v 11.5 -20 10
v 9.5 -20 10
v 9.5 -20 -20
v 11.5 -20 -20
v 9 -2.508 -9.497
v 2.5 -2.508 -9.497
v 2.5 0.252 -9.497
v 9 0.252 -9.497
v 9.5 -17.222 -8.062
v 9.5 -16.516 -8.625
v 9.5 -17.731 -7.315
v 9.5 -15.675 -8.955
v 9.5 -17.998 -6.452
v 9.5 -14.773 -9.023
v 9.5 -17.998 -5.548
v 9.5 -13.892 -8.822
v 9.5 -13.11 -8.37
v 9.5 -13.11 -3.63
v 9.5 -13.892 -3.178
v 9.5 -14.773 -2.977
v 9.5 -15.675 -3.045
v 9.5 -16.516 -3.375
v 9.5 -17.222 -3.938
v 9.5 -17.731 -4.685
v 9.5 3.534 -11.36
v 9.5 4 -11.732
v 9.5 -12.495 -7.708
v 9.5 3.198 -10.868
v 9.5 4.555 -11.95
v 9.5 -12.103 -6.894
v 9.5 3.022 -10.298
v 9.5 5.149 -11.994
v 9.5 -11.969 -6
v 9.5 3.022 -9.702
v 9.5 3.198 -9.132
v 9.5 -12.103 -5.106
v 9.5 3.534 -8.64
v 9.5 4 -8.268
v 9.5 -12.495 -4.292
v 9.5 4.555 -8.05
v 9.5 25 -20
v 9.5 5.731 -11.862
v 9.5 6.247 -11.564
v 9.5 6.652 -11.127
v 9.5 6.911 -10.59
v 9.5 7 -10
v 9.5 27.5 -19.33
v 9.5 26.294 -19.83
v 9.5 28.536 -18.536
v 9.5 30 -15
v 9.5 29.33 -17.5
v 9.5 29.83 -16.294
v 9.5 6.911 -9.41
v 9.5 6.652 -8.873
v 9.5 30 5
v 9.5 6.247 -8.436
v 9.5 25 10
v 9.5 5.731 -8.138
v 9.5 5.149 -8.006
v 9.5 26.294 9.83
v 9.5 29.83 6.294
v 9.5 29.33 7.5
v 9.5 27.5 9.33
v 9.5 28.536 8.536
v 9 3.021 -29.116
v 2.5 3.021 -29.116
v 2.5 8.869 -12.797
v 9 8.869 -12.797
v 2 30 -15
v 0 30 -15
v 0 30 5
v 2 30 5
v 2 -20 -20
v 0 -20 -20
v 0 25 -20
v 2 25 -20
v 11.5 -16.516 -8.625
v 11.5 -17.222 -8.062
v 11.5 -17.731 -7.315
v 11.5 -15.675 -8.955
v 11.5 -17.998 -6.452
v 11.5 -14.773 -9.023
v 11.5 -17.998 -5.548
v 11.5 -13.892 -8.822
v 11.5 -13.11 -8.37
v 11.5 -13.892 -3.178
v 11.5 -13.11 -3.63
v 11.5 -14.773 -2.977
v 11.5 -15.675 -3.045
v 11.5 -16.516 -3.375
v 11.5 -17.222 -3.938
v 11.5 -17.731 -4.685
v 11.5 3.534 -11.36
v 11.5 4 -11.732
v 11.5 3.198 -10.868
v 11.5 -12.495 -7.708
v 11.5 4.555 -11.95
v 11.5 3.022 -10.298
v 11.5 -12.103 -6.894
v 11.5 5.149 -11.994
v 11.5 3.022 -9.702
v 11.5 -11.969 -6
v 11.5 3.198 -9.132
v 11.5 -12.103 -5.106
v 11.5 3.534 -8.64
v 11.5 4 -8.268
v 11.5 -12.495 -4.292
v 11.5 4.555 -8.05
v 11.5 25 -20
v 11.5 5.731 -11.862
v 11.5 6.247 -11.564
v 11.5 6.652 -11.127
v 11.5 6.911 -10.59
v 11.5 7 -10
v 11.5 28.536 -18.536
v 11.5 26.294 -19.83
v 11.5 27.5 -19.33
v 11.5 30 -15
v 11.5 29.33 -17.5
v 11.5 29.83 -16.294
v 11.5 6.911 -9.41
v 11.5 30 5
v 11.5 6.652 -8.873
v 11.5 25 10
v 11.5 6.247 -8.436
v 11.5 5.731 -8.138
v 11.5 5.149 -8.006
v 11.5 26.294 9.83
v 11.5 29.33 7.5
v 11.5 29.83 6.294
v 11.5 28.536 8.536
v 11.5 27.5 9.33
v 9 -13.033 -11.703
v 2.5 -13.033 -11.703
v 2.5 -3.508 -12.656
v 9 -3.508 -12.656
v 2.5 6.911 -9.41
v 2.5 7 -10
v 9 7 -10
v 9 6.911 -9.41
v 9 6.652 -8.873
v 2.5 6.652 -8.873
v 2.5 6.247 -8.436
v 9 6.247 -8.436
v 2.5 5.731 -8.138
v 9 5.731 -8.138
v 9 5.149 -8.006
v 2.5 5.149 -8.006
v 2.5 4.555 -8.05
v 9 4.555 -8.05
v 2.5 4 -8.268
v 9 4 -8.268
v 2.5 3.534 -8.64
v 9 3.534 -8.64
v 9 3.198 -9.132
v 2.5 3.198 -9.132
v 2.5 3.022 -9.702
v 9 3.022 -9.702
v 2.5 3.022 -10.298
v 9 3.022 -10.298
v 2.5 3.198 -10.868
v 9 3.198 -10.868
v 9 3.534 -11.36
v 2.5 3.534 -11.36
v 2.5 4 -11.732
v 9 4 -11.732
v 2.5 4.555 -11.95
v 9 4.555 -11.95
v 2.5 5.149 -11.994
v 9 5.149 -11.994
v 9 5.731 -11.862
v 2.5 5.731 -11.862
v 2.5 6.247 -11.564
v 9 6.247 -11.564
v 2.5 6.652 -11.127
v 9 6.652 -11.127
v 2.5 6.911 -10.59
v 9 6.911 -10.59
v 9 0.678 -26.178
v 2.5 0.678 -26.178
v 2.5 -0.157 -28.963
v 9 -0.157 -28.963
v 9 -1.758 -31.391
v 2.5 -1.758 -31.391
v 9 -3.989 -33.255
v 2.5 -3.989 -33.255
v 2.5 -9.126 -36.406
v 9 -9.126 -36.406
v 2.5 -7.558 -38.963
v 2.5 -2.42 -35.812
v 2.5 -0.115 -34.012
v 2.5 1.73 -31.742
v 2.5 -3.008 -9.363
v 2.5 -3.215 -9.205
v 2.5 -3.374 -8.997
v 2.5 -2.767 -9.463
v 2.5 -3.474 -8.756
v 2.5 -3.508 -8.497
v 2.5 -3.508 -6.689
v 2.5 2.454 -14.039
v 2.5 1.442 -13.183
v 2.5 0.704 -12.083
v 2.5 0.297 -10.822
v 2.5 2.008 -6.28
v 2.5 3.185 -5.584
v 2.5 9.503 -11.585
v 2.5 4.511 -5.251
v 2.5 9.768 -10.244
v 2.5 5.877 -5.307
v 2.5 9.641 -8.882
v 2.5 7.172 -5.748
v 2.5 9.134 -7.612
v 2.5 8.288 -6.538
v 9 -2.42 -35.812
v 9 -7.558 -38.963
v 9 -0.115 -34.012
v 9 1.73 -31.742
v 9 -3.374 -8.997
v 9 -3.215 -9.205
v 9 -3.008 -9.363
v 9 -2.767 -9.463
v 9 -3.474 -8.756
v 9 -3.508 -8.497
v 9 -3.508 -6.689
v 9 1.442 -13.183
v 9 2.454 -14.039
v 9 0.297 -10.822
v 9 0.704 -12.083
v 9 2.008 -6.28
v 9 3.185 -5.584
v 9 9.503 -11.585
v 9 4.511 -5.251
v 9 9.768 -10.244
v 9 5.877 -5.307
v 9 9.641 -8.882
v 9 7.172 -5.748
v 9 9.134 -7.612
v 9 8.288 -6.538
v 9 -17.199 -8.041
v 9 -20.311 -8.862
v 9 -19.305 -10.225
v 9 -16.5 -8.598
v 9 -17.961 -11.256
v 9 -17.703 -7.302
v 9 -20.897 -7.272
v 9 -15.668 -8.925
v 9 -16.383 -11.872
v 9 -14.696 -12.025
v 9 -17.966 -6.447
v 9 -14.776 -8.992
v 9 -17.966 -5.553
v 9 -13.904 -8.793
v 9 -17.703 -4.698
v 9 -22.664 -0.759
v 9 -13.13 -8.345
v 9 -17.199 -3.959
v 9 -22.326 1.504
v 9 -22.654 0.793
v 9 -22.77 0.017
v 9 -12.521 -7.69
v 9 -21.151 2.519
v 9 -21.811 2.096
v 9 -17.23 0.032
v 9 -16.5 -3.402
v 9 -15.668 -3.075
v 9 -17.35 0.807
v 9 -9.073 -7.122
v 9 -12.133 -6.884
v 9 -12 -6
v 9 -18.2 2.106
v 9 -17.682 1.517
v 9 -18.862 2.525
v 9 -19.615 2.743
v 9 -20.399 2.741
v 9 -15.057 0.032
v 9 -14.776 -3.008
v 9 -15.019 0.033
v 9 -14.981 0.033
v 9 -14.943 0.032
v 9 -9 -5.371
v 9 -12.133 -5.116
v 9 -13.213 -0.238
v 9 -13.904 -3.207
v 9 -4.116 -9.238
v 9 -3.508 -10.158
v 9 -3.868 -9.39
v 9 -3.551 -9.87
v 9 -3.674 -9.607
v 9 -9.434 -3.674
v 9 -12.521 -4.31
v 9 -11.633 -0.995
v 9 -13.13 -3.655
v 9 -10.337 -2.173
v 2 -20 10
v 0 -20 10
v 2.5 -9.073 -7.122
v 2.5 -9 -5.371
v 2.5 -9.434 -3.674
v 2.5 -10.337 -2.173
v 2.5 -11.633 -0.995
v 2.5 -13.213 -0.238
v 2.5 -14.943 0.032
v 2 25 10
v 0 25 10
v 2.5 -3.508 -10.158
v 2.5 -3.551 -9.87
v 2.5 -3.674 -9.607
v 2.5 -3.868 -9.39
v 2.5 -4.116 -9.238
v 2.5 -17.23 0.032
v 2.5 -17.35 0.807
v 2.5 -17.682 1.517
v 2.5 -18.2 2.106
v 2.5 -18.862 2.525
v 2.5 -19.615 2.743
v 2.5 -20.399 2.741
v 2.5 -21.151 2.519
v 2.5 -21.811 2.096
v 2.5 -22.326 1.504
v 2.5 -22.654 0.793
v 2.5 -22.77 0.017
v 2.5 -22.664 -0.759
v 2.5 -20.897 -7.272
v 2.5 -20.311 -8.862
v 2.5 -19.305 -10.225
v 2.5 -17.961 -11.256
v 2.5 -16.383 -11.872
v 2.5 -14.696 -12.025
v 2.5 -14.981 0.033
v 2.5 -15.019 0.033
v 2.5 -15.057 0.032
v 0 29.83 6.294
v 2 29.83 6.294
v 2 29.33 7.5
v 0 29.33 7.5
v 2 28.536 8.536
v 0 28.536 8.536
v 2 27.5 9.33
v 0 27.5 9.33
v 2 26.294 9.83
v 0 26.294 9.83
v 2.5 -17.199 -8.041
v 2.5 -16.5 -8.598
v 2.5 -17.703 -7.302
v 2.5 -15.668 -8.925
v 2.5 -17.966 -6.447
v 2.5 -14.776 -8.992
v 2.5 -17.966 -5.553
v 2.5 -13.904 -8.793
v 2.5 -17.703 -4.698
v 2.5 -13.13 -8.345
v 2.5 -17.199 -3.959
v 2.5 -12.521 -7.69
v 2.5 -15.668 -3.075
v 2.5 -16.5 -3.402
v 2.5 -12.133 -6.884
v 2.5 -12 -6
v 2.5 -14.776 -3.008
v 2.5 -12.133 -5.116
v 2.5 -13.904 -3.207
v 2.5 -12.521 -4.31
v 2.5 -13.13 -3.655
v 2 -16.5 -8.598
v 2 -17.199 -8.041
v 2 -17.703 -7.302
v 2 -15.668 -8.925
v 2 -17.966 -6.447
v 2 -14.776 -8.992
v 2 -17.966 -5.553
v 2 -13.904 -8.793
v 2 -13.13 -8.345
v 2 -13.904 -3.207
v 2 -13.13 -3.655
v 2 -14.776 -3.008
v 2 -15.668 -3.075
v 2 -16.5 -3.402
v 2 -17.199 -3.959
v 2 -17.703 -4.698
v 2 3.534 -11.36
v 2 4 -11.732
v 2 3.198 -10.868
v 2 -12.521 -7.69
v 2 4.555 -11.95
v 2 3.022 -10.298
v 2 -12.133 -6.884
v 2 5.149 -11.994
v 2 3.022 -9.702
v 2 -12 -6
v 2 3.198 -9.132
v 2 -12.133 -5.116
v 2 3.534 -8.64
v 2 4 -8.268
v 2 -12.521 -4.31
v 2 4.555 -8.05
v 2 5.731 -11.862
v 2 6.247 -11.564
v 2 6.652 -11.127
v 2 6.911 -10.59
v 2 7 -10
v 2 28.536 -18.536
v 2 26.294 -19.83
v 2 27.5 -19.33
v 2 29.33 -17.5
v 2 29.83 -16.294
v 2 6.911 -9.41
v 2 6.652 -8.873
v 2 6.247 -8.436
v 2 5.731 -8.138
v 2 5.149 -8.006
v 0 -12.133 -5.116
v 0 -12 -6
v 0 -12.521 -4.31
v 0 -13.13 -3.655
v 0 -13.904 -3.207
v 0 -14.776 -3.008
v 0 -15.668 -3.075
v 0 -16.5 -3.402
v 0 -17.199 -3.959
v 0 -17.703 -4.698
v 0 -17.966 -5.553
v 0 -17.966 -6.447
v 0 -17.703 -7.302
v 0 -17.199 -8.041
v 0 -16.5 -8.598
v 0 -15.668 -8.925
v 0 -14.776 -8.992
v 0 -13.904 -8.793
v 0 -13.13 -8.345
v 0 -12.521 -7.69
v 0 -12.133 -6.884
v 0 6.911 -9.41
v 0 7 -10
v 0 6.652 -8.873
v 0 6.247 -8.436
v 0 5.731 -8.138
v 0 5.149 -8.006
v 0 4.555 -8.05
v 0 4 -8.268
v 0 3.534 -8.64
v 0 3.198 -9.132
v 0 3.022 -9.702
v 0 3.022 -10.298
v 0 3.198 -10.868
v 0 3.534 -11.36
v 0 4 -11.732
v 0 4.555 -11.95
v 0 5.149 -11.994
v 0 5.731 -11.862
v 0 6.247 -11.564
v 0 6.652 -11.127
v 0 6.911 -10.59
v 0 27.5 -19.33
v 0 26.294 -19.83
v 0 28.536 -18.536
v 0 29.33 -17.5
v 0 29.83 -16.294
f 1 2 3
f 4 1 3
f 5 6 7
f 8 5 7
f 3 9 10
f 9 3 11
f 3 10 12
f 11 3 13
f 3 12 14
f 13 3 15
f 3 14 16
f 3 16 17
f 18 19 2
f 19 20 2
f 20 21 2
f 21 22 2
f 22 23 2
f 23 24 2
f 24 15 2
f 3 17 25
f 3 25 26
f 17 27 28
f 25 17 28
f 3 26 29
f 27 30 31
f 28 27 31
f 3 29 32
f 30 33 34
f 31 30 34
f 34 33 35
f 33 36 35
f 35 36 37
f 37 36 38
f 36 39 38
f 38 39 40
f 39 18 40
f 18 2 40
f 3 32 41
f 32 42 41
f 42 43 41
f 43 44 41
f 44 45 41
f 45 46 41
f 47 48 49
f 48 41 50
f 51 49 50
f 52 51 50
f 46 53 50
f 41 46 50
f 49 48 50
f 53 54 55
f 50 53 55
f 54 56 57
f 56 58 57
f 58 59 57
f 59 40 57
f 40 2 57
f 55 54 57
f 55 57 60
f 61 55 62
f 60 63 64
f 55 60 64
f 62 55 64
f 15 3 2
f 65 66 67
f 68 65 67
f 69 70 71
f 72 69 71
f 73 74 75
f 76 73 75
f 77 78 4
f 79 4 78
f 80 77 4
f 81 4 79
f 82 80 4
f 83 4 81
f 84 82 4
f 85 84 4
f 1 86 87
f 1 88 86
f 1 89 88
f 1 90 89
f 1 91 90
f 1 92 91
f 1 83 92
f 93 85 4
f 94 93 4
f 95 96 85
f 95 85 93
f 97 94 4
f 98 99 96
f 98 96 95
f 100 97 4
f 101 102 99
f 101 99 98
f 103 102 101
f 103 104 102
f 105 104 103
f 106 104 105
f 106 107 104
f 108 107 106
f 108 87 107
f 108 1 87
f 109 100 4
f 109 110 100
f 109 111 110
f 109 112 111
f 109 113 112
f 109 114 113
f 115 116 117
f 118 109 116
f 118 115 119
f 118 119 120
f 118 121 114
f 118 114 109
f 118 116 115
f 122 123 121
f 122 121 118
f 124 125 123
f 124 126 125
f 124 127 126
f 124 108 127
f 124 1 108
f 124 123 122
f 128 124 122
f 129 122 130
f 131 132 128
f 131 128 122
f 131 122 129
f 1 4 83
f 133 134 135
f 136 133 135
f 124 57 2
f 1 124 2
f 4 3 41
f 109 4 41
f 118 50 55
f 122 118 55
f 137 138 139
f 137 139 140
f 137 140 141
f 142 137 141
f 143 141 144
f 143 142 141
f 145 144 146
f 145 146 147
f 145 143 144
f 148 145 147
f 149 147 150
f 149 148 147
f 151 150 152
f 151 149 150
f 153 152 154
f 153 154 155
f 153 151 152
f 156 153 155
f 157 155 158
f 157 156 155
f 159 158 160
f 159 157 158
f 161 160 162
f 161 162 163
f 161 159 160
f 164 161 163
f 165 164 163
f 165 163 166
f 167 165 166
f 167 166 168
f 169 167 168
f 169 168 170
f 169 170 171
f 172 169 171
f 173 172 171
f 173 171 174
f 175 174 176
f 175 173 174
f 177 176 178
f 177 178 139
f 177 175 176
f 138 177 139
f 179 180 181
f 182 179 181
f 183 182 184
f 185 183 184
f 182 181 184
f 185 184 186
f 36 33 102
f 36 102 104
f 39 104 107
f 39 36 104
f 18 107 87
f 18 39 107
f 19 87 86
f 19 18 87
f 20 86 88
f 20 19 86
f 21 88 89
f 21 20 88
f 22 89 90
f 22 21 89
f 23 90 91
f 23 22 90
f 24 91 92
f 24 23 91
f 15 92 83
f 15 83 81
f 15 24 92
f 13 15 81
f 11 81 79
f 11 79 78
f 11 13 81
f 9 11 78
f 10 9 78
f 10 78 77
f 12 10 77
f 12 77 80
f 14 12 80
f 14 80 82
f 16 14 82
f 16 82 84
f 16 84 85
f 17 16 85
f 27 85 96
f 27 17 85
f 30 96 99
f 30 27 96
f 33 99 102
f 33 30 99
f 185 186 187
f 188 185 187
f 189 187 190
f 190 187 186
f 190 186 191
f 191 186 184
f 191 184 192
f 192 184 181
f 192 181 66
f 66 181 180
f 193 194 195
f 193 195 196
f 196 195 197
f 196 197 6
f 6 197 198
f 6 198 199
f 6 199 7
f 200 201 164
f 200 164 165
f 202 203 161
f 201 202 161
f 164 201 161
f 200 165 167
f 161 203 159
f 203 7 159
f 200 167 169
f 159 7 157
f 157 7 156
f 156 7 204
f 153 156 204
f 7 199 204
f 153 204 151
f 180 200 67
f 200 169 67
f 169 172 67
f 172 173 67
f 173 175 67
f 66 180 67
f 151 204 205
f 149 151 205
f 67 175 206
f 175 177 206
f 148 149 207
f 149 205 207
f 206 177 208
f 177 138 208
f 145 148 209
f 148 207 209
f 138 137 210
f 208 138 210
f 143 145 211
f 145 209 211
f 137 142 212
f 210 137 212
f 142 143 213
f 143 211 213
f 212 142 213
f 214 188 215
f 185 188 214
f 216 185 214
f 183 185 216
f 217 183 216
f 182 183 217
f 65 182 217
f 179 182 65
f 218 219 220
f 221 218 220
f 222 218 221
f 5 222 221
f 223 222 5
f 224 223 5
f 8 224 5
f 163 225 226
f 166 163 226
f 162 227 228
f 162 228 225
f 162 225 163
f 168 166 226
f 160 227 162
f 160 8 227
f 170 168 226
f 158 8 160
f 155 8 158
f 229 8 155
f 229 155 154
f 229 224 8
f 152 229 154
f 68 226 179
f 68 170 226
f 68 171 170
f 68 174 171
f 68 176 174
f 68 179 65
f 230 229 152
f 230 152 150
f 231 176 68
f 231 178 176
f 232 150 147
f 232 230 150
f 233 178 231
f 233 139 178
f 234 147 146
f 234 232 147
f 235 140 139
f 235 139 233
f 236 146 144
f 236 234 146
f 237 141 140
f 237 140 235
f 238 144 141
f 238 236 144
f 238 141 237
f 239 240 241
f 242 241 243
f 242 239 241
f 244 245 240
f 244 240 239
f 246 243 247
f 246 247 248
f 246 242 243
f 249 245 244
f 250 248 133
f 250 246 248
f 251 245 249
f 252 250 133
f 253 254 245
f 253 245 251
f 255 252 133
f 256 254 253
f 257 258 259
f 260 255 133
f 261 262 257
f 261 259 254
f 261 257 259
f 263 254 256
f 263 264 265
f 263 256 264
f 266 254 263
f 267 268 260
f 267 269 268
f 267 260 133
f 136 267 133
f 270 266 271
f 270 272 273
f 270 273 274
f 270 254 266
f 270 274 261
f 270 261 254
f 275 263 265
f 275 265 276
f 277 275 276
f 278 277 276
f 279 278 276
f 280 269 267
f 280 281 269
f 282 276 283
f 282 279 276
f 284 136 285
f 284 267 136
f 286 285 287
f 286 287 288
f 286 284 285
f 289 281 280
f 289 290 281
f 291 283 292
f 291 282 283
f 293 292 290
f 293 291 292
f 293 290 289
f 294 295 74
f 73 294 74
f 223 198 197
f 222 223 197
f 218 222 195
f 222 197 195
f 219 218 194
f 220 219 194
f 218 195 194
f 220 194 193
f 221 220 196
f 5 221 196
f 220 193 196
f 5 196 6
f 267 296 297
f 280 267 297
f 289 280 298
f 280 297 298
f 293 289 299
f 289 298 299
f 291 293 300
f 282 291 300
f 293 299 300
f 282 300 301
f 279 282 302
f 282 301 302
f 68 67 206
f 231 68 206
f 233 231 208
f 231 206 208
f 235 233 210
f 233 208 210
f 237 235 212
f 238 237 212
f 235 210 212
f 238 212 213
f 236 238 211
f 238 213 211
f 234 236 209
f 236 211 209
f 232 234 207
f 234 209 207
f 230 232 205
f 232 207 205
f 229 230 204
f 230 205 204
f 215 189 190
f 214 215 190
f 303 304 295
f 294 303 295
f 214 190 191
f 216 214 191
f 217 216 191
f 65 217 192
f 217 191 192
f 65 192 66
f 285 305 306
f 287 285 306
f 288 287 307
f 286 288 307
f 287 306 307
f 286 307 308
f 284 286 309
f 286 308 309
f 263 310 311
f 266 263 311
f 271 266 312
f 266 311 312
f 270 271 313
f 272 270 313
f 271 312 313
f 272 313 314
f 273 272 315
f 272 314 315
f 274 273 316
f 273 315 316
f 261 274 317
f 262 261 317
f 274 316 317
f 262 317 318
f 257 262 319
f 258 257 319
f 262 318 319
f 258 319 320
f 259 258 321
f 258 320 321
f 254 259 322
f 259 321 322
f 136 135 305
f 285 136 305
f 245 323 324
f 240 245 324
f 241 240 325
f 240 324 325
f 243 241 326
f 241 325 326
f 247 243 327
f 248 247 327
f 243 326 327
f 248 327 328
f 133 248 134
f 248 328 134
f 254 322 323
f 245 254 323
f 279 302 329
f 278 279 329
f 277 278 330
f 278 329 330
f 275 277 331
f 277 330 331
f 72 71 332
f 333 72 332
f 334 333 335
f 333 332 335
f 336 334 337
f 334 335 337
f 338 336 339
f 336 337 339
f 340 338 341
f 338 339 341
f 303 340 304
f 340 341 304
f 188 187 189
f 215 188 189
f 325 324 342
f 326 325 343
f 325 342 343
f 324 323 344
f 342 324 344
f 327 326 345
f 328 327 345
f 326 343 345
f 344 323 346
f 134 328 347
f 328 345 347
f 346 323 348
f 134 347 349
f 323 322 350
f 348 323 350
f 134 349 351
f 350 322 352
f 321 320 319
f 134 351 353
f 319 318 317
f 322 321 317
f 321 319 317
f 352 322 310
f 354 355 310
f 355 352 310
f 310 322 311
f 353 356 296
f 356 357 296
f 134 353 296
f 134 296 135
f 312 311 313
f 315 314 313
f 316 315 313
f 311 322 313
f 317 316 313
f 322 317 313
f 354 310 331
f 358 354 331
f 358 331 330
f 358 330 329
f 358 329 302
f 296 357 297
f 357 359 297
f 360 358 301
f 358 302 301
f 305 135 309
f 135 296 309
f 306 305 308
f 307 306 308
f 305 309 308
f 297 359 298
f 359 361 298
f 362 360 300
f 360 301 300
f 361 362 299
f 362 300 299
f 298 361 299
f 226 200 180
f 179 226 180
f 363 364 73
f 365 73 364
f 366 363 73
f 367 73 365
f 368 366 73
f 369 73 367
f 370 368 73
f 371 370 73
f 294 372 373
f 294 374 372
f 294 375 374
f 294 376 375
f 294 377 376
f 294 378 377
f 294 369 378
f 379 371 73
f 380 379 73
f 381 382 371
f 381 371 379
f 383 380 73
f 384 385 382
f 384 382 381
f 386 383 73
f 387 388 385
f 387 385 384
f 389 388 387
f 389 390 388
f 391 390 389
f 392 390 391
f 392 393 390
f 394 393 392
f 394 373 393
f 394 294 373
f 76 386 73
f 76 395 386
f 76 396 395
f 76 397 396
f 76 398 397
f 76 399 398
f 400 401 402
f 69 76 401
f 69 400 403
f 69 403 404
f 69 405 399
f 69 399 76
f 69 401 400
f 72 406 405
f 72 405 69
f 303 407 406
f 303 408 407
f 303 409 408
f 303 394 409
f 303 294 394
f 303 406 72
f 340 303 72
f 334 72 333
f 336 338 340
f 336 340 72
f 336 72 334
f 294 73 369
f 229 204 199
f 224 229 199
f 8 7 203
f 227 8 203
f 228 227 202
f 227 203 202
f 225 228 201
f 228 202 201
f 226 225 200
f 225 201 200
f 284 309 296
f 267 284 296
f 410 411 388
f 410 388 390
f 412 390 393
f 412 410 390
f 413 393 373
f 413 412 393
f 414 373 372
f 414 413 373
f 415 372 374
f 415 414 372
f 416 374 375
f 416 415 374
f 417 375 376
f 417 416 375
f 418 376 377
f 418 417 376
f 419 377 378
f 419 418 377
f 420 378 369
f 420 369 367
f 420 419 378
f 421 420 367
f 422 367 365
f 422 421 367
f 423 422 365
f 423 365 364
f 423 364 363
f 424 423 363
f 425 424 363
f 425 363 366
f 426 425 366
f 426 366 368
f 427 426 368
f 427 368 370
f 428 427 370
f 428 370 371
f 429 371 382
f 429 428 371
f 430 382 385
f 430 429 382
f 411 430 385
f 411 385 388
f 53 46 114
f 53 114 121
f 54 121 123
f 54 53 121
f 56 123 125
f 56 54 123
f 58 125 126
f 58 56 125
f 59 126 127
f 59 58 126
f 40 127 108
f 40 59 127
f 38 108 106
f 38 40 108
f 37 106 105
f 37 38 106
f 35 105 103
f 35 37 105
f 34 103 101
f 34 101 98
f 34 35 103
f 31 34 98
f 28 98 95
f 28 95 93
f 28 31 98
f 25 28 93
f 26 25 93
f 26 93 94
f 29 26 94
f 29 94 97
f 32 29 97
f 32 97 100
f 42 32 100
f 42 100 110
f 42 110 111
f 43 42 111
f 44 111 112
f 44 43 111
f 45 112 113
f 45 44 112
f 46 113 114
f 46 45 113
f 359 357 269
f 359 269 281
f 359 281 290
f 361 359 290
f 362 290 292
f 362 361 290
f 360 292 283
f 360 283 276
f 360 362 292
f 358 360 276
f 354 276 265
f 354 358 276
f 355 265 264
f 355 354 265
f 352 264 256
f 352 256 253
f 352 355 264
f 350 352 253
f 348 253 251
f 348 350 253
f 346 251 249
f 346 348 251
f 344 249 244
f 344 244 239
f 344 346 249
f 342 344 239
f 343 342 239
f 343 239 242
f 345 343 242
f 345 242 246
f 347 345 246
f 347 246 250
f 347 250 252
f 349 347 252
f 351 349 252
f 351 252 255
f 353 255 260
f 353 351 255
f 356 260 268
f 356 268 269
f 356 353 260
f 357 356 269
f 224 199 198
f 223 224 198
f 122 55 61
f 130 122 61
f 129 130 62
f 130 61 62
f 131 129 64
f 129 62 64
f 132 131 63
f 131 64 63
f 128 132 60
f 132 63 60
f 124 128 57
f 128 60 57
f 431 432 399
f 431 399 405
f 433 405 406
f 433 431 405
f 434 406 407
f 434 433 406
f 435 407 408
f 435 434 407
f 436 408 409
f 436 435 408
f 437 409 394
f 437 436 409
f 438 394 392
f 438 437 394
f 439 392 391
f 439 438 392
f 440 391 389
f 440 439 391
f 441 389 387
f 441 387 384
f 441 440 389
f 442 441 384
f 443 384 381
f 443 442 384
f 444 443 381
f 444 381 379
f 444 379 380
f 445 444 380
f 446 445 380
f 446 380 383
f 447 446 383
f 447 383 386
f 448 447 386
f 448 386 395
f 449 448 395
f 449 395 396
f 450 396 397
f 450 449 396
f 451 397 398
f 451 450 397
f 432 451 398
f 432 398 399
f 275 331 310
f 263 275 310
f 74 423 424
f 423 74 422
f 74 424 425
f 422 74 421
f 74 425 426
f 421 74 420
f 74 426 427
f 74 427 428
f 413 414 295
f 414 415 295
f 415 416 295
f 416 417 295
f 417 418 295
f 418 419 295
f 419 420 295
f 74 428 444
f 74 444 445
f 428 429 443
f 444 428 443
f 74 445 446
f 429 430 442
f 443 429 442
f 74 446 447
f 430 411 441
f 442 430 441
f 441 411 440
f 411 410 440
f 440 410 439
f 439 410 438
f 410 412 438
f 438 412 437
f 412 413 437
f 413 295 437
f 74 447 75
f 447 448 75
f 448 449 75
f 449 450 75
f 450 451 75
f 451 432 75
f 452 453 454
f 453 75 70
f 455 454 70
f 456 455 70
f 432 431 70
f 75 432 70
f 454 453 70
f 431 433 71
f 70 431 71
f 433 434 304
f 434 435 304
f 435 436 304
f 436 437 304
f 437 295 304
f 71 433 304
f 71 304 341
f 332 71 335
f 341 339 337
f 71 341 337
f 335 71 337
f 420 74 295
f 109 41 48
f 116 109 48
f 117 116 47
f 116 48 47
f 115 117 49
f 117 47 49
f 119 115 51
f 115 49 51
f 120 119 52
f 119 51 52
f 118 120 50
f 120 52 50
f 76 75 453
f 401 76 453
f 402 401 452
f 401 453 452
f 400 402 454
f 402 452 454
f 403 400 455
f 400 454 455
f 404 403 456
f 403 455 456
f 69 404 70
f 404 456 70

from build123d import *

# Parameters (mm, degrees)
F0_R     = 3
F0_R_2   = 2
F1_DEPTH = 2
F3_START = 0.5
F2_R     = 3
F3_DEPTH = 6.5
F2_R_2   = 2
F5_START = 0.5
F4_R     = 3.0314707769
F4_R_2   = 2
F5_DEPTH = 2


with BuildPart() as f1:
    # F0 (on Right) → F1 (new body)
    with BuildSketch(Plane.YZ):
        with BuildLine():
            Line((25, 10), (-20, 10))
            Line((-20, 10), (-20, -20))
            Line((-20, -20), (25, -20))
            ThreePointArc((25, -20), (28.5355339059, -18.5355339059), (30, -15))
            Line((30, -15), (30, 5))
            ThreePointArc((30, 5), (28.5355339059, 8.5355339059), (25, 10))
        make_face()
        with Locations((-15, -6)):
            Circle(F0_R, mode=Mode.SUBTRACT)
        with Locations((5, -10)):
            Circle(F0_R_2, mode=Mode.SUBTRACT)
    extrude(amount=F1_DEPTH)


with BuildPart() as f3:
    # F2 (on face) → F3 (new body)
    with BuildSketch(Plane.YZ.offset(2).offset(F3_START)):
        with BuildLine():
            Line((-22.6637491681, -0.7594555912), (-20.8968037957, -7.2724931646))
            ThreePointArc((-20.8968037957, -7.2724931646), (-17.9609272097, -11.2558961099), (-13.03272348, -11.7027499466))
            Line((-13.03272348, -11.7027499466), (-3.5083352122, -12.6557552287))
            Line((-3.5083352122, -12.6557552287), (-3.5083352122, -10.1577758701))
            ThreePointArc((-3.5083352122, -10.1577758701), (-3.6738613113, -9.6067284051), (-4.1156418296, -9.2381064147))
            Line((-4.1156418296, -9.2381064147), (-9.0726259367, -7.1215037103))
            ThreePointArc((-9.0726259367, -7.1215037103), (-10.3366335686, -2.173180513), (-14.943107279, 0.0322713034))
            Line((-14.943107279, 0.0322713034), (-15.056892721, 0.0322713034))
            Line((-15.056892721, 0.0322713034), (-17.2302904505, 0.0322713034))
            ThreePointArc((-17.2302904505, 0.0322713034), (-20.3993930013, 2.7409519617), (-22.6637491681, -0.7594555912))
        make_face()
        with Locations((-15, -6)):
            Circle(F2_R, mode=Mode.SUBTRACT)
        with BuildLine():
            ThreePointArc((-14.943107279, 0.0322713034), (-15, 0.0325395862), (-15.056892721, 0.0322713034))
            Line((-15.056892721, 0.0322713034), (-14.943107279, 0.0322713034))
        make_face()
    extrude(amount=F3_DEPTH)


with BuildPart() as f3b:
    # F2 (on face) → F3, piece 2 (new body)
    with BuildSketch(Plane.YZ.offset(2).offset(F3_START)):
        with BuildLine():
            Line((-2.5083352122, -9.497422725), (0.2523448505, -9.497422725))
            ThreePointArc((0.2523448505, -9.497422725), (0.7040515837, -12.0827003001), (2.4539394436, -14.038612259))
            Line((2.4539394436, -14.038612259), (0.6775140536, -26.1783799444))
            ThreePointArc((0.6775140536, -26.1783799444), (-0.8687716335, -30.2355068211), (-3.9888260326, -33.2548674266))
            Line((-3.9888260326, -33.2548674266), (-9.1261887803, -36.4057830215))
            Line((-9.1261887803, -36.4057830215), (-7.5577032005, -38.9630966484))
            Line((-7.5577032005, -38.9630966484), (-2.4203404528, -35.8121810535))
            ThreePointArc((-2.4203404528, -35.8121810535), (0.8719091232, -32.9287608623), (3.0207551338, -29.1162183915))
            Line((3.0207551338, -29.1162183915), (8.8692096956, -12.796789171))
            ThreePointArc((8.8692096956, -12.796789171), (8.2877227219, -6.5382529497), (2.0075366127, -6.2800569612))
            Line((2.0075366127, -6.2800569612), (-3.5083352122, -6.6892408108))
            Line((-3.5083352122, -6.6892408108), (-3.5083352122, -8.497422725))
            ThreePointArc((-3.5083352122, -8.497422725), (-3.2154419934, -9.2045295061), (-2.5083352122, -9.497422725))
        make_face()
        with Locations((5, -10)):
            Circle(F2_R_2, mode=Mode.SUBTRACT)
    extrude(amount=F3_DEPTH)


with BuildPart() as f5:
    # F4 (on face) → F5 (new body)
    with BuildSketch(Plane.YZ.offset(9).offset(F5_START)):
        with BuildLine():
            Line((25, 10), (-20, 10))
            Line((-20, 10), (-20, -20))
            Line((-20, -20), (25, -20))
            ThreePointArc((25, -20), (28.5355339059, -18.5355339059), (30, -15))
            Line((30, -15), (30, 5))
            ThreePointArc((30, 5), (28.5355339059, 8.5355339059), (25, 10))
        make_face()
        with Locations((-15, -6)):
            Circle(F4_R, mode=Mode.SUBTRACT)
        with Locations((5, -10)):
            Circle(F4_R_2, mode=Mode.SUBTRACT)
    extrude(amount=F5_DEPTH)


solid = Compound([f1.part, f3.part, f3b.part, f5.part])
